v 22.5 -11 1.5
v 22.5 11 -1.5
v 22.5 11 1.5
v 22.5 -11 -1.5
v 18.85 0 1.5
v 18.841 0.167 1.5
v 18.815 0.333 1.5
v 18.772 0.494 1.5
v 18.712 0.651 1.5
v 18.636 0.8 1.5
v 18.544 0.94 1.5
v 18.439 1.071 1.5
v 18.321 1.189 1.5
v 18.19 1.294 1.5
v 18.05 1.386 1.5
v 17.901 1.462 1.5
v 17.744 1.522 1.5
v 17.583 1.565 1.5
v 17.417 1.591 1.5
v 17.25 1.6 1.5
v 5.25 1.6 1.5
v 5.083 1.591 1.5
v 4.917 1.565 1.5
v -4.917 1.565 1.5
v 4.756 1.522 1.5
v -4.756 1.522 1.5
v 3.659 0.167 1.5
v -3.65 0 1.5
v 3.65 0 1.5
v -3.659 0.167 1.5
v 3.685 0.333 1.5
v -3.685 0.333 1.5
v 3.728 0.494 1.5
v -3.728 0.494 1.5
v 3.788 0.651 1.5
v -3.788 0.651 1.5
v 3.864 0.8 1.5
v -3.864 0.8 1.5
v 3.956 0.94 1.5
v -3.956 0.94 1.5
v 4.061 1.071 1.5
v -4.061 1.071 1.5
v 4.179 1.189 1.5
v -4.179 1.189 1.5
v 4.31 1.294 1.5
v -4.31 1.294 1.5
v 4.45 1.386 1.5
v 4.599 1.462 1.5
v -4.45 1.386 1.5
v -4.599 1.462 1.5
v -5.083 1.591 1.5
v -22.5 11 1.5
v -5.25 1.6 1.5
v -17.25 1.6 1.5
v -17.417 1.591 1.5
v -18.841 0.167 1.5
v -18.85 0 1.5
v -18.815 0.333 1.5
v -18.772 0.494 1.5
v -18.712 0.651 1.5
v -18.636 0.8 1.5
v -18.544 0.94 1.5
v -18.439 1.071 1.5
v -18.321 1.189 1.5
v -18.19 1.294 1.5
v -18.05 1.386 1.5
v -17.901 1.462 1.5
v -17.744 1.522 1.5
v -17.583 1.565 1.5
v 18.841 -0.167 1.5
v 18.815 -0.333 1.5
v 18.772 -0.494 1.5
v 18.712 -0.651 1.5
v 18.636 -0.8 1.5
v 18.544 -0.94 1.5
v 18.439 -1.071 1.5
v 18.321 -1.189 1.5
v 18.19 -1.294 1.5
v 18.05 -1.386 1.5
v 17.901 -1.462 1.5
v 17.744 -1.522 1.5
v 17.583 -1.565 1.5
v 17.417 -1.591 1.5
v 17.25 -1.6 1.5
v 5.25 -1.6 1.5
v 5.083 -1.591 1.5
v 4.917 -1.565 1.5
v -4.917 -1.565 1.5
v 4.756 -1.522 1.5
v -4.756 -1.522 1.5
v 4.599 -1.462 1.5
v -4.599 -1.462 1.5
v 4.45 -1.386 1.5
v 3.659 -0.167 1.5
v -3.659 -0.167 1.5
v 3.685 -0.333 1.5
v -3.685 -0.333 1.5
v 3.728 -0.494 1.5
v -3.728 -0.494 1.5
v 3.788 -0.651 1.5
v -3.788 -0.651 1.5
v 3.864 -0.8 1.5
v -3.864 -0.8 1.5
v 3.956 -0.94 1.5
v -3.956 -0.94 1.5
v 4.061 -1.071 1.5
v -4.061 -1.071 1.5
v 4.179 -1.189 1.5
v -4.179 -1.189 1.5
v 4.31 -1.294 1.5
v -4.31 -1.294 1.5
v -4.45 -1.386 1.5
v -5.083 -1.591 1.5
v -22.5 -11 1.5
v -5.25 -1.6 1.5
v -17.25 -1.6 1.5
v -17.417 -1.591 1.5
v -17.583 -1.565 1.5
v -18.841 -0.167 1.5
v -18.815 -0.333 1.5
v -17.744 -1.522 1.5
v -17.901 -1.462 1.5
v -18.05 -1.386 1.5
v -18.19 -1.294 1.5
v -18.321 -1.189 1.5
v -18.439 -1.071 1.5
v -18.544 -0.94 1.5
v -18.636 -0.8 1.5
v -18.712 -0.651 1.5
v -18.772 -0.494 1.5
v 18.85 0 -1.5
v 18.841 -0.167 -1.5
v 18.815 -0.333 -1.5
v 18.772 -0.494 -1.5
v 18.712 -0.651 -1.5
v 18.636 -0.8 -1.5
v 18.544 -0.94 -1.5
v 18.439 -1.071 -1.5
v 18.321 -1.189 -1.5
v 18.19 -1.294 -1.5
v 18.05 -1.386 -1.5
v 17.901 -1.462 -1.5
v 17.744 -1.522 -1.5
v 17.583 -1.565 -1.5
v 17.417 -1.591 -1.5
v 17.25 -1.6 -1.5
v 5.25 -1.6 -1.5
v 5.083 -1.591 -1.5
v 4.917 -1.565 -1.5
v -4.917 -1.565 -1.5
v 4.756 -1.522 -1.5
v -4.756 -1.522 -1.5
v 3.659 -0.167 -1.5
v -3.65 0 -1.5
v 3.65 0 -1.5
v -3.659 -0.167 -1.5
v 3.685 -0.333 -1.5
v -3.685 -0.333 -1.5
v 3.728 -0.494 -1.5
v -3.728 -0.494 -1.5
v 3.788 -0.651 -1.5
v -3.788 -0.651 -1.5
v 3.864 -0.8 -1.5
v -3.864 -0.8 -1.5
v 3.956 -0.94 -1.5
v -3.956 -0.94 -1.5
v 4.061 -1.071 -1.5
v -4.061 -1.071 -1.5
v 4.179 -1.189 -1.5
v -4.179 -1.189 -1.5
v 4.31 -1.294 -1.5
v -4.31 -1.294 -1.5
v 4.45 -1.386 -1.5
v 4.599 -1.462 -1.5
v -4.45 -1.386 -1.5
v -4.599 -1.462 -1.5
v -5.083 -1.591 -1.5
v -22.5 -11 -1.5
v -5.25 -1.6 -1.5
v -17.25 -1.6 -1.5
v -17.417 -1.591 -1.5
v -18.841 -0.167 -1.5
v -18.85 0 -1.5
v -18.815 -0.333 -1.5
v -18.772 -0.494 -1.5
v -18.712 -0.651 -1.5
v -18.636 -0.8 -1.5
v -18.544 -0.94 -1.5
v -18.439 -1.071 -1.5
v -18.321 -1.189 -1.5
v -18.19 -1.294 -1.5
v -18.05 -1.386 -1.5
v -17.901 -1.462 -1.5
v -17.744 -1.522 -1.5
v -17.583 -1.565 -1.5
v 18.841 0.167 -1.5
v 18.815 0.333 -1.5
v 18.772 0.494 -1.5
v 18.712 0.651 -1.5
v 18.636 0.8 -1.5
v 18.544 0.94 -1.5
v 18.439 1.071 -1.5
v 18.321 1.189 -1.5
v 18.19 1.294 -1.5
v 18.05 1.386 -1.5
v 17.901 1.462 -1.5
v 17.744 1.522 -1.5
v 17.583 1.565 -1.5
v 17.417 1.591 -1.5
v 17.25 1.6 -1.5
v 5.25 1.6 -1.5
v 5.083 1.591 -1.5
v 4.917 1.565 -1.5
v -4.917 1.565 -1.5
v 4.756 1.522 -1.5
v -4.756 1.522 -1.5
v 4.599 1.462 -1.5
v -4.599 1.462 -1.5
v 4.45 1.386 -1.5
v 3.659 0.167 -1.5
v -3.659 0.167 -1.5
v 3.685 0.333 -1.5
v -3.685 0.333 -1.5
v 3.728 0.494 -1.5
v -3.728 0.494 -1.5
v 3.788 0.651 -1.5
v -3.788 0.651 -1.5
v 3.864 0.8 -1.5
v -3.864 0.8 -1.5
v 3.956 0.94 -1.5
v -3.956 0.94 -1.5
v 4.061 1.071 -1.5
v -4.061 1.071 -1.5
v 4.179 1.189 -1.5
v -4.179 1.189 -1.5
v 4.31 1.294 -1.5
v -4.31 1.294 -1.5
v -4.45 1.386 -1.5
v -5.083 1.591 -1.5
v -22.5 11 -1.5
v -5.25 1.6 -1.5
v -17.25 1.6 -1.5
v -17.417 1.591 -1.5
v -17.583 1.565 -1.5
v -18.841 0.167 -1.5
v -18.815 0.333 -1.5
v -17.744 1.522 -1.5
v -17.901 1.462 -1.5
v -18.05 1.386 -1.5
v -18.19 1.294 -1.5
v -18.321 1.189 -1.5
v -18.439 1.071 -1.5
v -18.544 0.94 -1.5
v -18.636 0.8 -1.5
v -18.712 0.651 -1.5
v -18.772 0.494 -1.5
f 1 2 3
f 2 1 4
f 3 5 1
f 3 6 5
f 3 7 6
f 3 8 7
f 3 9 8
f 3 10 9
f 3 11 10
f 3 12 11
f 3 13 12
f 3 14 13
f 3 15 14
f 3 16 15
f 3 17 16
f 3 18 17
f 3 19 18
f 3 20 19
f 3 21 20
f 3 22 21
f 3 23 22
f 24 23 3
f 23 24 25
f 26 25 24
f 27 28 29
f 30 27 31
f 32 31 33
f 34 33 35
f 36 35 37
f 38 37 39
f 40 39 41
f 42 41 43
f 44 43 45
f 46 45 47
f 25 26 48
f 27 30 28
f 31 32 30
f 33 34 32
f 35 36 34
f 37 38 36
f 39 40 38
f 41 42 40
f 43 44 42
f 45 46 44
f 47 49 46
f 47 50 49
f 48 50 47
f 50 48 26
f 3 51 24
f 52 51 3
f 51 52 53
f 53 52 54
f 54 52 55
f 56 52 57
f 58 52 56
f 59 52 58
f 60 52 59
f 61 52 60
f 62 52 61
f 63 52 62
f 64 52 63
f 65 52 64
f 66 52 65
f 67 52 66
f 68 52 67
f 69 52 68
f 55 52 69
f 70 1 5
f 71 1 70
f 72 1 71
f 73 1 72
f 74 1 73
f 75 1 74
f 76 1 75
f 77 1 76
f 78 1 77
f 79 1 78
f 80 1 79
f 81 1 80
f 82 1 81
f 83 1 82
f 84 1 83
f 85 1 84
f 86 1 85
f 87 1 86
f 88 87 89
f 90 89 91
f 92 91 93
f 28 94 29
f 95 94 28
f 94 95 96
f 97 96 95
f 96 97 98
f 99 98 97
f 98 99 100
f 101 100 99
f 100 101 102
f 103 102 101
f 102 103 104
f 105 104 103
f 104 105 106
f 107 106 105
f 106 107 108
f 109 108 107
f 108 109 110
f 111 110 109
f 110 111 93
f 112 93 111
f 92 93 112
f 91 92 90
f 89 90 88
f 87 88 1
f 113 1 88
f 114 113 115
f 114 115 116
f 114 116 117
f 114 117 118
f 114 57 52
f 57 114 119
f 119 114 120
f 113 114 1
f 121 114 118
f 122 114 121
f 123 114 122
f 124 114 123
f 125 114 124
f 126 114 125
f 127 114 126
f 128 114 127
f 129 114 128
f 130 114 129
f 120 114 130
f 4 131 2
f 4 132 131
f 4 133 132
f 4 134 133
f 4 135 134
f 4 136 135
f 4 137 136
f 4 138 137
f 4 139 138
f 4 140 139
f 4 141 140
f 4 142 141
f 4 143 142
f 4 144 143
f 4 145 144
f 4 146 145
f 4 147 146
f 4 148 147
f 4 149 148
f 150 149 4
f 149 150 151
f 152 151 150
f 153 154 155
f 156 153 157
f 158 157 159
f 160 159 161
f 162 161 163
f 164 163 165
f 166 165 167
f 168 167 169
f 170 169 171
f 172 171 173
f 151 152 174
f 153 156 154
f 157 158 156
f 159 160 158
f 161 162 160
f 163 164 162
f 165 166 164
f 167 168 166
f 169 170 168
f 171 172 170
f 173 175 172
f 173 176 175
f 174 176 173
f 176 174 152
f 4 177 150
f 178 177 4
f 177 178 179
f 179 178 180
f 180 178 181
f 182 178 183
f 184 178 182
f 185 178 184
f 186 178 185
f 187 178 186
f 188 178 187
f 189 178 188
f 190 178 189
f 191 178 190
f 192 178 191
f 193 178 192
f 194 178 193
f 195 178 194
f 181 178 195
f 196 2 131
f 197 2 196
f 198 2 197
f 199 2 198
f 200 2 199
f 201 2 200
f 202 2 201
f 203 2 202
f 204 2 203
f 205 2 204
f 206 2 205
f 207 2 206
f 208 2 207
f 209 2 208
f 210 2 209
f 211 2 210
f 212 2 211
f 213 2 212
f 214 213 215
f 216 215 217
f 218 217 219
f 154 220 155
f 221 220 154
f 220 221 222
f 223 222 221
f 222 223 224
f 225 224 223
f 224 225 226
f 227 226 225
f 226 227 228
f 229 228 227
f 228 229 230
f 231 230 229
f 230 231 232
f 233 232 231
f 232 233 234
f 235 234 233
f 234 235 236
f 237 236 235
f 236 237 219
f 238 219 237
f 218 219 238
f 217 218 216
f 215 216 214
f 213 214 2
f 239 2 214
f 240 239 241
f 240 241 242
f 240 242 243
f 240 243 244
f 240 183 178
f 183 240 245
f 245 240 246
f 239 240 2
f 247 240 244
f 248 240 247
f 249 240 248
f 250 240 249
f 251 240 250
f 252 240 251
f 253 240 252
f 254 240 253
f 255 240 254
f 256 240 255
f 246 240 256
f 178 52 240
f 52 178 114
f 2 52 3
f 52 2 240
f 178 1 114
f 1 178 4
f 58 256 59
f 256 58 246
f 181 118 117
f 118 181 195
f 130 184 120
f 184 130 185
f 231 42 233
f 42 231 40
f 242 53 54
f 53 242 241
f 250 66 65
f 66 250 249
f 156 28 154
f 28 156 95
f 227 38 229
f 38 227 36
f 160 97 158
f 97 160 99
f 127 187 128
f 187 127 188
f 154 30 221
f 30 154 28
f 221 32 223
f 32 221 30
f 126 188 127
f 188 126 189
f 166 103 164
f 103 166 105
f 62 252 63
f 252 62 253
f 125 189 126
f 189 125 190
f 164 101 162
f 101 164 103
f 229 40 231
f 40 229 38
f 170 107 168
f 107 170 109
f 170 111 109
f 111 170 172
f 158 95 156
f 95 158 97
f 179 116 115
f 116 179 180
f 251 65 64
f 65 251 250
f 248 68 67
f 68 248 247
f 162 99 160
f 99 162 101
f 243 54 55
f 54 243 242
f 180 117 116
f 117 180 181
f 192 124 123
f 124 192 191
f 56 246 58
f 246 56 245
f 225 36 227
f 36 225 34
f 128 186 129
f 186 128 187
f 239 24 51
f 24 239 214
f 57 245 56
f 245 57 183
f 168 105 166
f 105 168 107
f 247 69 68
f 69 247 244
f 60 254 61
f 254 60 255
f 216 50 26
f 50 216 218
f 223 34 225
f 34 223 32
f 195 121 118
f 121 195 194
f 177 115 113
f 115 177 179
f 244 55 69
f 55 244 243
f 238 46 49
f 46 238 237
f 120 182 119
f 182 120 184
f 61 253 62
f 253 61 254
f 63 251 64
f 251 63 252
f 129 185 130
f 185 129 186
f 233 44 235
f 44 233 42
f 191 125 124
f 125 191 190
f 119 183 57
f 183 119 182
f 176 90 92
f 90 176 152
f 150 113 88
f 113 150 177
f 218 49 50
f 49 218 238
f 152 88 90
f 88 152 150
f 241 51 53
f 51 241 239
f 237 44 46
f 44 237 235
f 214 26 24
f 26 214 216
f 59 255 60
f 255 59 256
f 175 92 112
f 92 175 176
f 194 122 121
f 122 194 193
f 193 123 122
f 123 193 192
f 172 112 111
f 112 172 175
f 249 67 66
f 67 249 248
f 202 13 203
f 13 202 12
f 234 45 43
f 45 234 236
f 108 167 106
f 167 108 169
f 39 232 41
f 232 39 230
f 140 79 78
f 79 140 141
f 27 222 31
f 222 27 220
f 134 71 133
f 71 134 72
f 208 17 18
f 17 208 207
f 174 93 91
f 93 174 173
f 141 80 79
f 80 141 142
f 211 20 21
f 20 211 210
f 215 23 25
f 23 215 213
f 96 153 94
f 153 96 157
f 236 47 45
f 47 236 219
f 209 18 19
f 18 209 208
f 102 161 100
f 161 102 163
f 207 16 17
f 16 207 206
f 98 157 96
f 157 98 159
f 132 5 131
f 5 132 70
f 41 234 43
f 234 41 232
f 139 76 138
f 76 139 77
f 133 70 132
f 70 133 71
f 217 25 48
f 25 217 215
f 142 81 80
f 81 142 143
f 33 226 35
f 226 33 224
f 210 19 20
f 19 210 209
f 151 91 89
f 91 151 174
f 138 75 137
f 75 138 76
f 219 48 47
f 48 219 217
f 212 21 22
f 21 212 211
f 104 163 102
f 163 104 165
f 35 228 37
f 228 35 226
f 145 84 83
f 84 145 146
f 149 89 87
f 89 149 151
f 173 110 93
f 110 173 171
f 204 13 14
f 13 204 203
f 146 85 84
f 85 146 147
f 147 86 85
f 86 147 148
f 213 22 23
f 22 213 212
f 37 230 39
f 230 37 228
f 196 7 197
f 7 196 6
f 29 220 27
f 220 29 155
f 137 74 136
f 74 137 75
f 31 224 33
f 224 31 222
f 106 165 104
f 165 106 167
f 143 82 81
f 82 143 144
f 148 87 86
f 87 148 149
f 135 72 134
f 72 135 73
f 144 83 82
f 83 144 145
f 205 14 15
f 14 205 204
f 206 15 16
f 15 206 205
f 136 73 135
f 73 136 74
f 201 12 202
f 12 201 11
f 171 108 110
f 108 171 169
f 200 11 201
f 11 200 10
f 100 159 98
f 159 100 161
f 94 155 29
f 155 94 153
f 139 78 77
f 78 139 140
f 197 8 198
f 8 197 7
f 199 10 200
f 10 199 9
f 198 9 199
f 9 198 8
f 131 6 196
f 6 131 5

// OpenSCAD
// Limit-switch mounting plate.
$fn = 60;
eps = 0.02;
plate_l = 45;
plate_w = 22;
plate_t = 3;
slot_l = 12;
module slot(x) { hull() { translate([x-slot_l/2,0,-plate_t/2-eps]) cylinder(d=3.2,h=plate_t+2*eps); translate([x+slot_l/2,0,-plate_t/2-eps]) cylinder(d=3.2,h=plate_t+2*eps); } }
difference() { cube([plate_l,plate_w,plate_t],center=true); slot(-plate_l/4); slot(plate_l/4); }
